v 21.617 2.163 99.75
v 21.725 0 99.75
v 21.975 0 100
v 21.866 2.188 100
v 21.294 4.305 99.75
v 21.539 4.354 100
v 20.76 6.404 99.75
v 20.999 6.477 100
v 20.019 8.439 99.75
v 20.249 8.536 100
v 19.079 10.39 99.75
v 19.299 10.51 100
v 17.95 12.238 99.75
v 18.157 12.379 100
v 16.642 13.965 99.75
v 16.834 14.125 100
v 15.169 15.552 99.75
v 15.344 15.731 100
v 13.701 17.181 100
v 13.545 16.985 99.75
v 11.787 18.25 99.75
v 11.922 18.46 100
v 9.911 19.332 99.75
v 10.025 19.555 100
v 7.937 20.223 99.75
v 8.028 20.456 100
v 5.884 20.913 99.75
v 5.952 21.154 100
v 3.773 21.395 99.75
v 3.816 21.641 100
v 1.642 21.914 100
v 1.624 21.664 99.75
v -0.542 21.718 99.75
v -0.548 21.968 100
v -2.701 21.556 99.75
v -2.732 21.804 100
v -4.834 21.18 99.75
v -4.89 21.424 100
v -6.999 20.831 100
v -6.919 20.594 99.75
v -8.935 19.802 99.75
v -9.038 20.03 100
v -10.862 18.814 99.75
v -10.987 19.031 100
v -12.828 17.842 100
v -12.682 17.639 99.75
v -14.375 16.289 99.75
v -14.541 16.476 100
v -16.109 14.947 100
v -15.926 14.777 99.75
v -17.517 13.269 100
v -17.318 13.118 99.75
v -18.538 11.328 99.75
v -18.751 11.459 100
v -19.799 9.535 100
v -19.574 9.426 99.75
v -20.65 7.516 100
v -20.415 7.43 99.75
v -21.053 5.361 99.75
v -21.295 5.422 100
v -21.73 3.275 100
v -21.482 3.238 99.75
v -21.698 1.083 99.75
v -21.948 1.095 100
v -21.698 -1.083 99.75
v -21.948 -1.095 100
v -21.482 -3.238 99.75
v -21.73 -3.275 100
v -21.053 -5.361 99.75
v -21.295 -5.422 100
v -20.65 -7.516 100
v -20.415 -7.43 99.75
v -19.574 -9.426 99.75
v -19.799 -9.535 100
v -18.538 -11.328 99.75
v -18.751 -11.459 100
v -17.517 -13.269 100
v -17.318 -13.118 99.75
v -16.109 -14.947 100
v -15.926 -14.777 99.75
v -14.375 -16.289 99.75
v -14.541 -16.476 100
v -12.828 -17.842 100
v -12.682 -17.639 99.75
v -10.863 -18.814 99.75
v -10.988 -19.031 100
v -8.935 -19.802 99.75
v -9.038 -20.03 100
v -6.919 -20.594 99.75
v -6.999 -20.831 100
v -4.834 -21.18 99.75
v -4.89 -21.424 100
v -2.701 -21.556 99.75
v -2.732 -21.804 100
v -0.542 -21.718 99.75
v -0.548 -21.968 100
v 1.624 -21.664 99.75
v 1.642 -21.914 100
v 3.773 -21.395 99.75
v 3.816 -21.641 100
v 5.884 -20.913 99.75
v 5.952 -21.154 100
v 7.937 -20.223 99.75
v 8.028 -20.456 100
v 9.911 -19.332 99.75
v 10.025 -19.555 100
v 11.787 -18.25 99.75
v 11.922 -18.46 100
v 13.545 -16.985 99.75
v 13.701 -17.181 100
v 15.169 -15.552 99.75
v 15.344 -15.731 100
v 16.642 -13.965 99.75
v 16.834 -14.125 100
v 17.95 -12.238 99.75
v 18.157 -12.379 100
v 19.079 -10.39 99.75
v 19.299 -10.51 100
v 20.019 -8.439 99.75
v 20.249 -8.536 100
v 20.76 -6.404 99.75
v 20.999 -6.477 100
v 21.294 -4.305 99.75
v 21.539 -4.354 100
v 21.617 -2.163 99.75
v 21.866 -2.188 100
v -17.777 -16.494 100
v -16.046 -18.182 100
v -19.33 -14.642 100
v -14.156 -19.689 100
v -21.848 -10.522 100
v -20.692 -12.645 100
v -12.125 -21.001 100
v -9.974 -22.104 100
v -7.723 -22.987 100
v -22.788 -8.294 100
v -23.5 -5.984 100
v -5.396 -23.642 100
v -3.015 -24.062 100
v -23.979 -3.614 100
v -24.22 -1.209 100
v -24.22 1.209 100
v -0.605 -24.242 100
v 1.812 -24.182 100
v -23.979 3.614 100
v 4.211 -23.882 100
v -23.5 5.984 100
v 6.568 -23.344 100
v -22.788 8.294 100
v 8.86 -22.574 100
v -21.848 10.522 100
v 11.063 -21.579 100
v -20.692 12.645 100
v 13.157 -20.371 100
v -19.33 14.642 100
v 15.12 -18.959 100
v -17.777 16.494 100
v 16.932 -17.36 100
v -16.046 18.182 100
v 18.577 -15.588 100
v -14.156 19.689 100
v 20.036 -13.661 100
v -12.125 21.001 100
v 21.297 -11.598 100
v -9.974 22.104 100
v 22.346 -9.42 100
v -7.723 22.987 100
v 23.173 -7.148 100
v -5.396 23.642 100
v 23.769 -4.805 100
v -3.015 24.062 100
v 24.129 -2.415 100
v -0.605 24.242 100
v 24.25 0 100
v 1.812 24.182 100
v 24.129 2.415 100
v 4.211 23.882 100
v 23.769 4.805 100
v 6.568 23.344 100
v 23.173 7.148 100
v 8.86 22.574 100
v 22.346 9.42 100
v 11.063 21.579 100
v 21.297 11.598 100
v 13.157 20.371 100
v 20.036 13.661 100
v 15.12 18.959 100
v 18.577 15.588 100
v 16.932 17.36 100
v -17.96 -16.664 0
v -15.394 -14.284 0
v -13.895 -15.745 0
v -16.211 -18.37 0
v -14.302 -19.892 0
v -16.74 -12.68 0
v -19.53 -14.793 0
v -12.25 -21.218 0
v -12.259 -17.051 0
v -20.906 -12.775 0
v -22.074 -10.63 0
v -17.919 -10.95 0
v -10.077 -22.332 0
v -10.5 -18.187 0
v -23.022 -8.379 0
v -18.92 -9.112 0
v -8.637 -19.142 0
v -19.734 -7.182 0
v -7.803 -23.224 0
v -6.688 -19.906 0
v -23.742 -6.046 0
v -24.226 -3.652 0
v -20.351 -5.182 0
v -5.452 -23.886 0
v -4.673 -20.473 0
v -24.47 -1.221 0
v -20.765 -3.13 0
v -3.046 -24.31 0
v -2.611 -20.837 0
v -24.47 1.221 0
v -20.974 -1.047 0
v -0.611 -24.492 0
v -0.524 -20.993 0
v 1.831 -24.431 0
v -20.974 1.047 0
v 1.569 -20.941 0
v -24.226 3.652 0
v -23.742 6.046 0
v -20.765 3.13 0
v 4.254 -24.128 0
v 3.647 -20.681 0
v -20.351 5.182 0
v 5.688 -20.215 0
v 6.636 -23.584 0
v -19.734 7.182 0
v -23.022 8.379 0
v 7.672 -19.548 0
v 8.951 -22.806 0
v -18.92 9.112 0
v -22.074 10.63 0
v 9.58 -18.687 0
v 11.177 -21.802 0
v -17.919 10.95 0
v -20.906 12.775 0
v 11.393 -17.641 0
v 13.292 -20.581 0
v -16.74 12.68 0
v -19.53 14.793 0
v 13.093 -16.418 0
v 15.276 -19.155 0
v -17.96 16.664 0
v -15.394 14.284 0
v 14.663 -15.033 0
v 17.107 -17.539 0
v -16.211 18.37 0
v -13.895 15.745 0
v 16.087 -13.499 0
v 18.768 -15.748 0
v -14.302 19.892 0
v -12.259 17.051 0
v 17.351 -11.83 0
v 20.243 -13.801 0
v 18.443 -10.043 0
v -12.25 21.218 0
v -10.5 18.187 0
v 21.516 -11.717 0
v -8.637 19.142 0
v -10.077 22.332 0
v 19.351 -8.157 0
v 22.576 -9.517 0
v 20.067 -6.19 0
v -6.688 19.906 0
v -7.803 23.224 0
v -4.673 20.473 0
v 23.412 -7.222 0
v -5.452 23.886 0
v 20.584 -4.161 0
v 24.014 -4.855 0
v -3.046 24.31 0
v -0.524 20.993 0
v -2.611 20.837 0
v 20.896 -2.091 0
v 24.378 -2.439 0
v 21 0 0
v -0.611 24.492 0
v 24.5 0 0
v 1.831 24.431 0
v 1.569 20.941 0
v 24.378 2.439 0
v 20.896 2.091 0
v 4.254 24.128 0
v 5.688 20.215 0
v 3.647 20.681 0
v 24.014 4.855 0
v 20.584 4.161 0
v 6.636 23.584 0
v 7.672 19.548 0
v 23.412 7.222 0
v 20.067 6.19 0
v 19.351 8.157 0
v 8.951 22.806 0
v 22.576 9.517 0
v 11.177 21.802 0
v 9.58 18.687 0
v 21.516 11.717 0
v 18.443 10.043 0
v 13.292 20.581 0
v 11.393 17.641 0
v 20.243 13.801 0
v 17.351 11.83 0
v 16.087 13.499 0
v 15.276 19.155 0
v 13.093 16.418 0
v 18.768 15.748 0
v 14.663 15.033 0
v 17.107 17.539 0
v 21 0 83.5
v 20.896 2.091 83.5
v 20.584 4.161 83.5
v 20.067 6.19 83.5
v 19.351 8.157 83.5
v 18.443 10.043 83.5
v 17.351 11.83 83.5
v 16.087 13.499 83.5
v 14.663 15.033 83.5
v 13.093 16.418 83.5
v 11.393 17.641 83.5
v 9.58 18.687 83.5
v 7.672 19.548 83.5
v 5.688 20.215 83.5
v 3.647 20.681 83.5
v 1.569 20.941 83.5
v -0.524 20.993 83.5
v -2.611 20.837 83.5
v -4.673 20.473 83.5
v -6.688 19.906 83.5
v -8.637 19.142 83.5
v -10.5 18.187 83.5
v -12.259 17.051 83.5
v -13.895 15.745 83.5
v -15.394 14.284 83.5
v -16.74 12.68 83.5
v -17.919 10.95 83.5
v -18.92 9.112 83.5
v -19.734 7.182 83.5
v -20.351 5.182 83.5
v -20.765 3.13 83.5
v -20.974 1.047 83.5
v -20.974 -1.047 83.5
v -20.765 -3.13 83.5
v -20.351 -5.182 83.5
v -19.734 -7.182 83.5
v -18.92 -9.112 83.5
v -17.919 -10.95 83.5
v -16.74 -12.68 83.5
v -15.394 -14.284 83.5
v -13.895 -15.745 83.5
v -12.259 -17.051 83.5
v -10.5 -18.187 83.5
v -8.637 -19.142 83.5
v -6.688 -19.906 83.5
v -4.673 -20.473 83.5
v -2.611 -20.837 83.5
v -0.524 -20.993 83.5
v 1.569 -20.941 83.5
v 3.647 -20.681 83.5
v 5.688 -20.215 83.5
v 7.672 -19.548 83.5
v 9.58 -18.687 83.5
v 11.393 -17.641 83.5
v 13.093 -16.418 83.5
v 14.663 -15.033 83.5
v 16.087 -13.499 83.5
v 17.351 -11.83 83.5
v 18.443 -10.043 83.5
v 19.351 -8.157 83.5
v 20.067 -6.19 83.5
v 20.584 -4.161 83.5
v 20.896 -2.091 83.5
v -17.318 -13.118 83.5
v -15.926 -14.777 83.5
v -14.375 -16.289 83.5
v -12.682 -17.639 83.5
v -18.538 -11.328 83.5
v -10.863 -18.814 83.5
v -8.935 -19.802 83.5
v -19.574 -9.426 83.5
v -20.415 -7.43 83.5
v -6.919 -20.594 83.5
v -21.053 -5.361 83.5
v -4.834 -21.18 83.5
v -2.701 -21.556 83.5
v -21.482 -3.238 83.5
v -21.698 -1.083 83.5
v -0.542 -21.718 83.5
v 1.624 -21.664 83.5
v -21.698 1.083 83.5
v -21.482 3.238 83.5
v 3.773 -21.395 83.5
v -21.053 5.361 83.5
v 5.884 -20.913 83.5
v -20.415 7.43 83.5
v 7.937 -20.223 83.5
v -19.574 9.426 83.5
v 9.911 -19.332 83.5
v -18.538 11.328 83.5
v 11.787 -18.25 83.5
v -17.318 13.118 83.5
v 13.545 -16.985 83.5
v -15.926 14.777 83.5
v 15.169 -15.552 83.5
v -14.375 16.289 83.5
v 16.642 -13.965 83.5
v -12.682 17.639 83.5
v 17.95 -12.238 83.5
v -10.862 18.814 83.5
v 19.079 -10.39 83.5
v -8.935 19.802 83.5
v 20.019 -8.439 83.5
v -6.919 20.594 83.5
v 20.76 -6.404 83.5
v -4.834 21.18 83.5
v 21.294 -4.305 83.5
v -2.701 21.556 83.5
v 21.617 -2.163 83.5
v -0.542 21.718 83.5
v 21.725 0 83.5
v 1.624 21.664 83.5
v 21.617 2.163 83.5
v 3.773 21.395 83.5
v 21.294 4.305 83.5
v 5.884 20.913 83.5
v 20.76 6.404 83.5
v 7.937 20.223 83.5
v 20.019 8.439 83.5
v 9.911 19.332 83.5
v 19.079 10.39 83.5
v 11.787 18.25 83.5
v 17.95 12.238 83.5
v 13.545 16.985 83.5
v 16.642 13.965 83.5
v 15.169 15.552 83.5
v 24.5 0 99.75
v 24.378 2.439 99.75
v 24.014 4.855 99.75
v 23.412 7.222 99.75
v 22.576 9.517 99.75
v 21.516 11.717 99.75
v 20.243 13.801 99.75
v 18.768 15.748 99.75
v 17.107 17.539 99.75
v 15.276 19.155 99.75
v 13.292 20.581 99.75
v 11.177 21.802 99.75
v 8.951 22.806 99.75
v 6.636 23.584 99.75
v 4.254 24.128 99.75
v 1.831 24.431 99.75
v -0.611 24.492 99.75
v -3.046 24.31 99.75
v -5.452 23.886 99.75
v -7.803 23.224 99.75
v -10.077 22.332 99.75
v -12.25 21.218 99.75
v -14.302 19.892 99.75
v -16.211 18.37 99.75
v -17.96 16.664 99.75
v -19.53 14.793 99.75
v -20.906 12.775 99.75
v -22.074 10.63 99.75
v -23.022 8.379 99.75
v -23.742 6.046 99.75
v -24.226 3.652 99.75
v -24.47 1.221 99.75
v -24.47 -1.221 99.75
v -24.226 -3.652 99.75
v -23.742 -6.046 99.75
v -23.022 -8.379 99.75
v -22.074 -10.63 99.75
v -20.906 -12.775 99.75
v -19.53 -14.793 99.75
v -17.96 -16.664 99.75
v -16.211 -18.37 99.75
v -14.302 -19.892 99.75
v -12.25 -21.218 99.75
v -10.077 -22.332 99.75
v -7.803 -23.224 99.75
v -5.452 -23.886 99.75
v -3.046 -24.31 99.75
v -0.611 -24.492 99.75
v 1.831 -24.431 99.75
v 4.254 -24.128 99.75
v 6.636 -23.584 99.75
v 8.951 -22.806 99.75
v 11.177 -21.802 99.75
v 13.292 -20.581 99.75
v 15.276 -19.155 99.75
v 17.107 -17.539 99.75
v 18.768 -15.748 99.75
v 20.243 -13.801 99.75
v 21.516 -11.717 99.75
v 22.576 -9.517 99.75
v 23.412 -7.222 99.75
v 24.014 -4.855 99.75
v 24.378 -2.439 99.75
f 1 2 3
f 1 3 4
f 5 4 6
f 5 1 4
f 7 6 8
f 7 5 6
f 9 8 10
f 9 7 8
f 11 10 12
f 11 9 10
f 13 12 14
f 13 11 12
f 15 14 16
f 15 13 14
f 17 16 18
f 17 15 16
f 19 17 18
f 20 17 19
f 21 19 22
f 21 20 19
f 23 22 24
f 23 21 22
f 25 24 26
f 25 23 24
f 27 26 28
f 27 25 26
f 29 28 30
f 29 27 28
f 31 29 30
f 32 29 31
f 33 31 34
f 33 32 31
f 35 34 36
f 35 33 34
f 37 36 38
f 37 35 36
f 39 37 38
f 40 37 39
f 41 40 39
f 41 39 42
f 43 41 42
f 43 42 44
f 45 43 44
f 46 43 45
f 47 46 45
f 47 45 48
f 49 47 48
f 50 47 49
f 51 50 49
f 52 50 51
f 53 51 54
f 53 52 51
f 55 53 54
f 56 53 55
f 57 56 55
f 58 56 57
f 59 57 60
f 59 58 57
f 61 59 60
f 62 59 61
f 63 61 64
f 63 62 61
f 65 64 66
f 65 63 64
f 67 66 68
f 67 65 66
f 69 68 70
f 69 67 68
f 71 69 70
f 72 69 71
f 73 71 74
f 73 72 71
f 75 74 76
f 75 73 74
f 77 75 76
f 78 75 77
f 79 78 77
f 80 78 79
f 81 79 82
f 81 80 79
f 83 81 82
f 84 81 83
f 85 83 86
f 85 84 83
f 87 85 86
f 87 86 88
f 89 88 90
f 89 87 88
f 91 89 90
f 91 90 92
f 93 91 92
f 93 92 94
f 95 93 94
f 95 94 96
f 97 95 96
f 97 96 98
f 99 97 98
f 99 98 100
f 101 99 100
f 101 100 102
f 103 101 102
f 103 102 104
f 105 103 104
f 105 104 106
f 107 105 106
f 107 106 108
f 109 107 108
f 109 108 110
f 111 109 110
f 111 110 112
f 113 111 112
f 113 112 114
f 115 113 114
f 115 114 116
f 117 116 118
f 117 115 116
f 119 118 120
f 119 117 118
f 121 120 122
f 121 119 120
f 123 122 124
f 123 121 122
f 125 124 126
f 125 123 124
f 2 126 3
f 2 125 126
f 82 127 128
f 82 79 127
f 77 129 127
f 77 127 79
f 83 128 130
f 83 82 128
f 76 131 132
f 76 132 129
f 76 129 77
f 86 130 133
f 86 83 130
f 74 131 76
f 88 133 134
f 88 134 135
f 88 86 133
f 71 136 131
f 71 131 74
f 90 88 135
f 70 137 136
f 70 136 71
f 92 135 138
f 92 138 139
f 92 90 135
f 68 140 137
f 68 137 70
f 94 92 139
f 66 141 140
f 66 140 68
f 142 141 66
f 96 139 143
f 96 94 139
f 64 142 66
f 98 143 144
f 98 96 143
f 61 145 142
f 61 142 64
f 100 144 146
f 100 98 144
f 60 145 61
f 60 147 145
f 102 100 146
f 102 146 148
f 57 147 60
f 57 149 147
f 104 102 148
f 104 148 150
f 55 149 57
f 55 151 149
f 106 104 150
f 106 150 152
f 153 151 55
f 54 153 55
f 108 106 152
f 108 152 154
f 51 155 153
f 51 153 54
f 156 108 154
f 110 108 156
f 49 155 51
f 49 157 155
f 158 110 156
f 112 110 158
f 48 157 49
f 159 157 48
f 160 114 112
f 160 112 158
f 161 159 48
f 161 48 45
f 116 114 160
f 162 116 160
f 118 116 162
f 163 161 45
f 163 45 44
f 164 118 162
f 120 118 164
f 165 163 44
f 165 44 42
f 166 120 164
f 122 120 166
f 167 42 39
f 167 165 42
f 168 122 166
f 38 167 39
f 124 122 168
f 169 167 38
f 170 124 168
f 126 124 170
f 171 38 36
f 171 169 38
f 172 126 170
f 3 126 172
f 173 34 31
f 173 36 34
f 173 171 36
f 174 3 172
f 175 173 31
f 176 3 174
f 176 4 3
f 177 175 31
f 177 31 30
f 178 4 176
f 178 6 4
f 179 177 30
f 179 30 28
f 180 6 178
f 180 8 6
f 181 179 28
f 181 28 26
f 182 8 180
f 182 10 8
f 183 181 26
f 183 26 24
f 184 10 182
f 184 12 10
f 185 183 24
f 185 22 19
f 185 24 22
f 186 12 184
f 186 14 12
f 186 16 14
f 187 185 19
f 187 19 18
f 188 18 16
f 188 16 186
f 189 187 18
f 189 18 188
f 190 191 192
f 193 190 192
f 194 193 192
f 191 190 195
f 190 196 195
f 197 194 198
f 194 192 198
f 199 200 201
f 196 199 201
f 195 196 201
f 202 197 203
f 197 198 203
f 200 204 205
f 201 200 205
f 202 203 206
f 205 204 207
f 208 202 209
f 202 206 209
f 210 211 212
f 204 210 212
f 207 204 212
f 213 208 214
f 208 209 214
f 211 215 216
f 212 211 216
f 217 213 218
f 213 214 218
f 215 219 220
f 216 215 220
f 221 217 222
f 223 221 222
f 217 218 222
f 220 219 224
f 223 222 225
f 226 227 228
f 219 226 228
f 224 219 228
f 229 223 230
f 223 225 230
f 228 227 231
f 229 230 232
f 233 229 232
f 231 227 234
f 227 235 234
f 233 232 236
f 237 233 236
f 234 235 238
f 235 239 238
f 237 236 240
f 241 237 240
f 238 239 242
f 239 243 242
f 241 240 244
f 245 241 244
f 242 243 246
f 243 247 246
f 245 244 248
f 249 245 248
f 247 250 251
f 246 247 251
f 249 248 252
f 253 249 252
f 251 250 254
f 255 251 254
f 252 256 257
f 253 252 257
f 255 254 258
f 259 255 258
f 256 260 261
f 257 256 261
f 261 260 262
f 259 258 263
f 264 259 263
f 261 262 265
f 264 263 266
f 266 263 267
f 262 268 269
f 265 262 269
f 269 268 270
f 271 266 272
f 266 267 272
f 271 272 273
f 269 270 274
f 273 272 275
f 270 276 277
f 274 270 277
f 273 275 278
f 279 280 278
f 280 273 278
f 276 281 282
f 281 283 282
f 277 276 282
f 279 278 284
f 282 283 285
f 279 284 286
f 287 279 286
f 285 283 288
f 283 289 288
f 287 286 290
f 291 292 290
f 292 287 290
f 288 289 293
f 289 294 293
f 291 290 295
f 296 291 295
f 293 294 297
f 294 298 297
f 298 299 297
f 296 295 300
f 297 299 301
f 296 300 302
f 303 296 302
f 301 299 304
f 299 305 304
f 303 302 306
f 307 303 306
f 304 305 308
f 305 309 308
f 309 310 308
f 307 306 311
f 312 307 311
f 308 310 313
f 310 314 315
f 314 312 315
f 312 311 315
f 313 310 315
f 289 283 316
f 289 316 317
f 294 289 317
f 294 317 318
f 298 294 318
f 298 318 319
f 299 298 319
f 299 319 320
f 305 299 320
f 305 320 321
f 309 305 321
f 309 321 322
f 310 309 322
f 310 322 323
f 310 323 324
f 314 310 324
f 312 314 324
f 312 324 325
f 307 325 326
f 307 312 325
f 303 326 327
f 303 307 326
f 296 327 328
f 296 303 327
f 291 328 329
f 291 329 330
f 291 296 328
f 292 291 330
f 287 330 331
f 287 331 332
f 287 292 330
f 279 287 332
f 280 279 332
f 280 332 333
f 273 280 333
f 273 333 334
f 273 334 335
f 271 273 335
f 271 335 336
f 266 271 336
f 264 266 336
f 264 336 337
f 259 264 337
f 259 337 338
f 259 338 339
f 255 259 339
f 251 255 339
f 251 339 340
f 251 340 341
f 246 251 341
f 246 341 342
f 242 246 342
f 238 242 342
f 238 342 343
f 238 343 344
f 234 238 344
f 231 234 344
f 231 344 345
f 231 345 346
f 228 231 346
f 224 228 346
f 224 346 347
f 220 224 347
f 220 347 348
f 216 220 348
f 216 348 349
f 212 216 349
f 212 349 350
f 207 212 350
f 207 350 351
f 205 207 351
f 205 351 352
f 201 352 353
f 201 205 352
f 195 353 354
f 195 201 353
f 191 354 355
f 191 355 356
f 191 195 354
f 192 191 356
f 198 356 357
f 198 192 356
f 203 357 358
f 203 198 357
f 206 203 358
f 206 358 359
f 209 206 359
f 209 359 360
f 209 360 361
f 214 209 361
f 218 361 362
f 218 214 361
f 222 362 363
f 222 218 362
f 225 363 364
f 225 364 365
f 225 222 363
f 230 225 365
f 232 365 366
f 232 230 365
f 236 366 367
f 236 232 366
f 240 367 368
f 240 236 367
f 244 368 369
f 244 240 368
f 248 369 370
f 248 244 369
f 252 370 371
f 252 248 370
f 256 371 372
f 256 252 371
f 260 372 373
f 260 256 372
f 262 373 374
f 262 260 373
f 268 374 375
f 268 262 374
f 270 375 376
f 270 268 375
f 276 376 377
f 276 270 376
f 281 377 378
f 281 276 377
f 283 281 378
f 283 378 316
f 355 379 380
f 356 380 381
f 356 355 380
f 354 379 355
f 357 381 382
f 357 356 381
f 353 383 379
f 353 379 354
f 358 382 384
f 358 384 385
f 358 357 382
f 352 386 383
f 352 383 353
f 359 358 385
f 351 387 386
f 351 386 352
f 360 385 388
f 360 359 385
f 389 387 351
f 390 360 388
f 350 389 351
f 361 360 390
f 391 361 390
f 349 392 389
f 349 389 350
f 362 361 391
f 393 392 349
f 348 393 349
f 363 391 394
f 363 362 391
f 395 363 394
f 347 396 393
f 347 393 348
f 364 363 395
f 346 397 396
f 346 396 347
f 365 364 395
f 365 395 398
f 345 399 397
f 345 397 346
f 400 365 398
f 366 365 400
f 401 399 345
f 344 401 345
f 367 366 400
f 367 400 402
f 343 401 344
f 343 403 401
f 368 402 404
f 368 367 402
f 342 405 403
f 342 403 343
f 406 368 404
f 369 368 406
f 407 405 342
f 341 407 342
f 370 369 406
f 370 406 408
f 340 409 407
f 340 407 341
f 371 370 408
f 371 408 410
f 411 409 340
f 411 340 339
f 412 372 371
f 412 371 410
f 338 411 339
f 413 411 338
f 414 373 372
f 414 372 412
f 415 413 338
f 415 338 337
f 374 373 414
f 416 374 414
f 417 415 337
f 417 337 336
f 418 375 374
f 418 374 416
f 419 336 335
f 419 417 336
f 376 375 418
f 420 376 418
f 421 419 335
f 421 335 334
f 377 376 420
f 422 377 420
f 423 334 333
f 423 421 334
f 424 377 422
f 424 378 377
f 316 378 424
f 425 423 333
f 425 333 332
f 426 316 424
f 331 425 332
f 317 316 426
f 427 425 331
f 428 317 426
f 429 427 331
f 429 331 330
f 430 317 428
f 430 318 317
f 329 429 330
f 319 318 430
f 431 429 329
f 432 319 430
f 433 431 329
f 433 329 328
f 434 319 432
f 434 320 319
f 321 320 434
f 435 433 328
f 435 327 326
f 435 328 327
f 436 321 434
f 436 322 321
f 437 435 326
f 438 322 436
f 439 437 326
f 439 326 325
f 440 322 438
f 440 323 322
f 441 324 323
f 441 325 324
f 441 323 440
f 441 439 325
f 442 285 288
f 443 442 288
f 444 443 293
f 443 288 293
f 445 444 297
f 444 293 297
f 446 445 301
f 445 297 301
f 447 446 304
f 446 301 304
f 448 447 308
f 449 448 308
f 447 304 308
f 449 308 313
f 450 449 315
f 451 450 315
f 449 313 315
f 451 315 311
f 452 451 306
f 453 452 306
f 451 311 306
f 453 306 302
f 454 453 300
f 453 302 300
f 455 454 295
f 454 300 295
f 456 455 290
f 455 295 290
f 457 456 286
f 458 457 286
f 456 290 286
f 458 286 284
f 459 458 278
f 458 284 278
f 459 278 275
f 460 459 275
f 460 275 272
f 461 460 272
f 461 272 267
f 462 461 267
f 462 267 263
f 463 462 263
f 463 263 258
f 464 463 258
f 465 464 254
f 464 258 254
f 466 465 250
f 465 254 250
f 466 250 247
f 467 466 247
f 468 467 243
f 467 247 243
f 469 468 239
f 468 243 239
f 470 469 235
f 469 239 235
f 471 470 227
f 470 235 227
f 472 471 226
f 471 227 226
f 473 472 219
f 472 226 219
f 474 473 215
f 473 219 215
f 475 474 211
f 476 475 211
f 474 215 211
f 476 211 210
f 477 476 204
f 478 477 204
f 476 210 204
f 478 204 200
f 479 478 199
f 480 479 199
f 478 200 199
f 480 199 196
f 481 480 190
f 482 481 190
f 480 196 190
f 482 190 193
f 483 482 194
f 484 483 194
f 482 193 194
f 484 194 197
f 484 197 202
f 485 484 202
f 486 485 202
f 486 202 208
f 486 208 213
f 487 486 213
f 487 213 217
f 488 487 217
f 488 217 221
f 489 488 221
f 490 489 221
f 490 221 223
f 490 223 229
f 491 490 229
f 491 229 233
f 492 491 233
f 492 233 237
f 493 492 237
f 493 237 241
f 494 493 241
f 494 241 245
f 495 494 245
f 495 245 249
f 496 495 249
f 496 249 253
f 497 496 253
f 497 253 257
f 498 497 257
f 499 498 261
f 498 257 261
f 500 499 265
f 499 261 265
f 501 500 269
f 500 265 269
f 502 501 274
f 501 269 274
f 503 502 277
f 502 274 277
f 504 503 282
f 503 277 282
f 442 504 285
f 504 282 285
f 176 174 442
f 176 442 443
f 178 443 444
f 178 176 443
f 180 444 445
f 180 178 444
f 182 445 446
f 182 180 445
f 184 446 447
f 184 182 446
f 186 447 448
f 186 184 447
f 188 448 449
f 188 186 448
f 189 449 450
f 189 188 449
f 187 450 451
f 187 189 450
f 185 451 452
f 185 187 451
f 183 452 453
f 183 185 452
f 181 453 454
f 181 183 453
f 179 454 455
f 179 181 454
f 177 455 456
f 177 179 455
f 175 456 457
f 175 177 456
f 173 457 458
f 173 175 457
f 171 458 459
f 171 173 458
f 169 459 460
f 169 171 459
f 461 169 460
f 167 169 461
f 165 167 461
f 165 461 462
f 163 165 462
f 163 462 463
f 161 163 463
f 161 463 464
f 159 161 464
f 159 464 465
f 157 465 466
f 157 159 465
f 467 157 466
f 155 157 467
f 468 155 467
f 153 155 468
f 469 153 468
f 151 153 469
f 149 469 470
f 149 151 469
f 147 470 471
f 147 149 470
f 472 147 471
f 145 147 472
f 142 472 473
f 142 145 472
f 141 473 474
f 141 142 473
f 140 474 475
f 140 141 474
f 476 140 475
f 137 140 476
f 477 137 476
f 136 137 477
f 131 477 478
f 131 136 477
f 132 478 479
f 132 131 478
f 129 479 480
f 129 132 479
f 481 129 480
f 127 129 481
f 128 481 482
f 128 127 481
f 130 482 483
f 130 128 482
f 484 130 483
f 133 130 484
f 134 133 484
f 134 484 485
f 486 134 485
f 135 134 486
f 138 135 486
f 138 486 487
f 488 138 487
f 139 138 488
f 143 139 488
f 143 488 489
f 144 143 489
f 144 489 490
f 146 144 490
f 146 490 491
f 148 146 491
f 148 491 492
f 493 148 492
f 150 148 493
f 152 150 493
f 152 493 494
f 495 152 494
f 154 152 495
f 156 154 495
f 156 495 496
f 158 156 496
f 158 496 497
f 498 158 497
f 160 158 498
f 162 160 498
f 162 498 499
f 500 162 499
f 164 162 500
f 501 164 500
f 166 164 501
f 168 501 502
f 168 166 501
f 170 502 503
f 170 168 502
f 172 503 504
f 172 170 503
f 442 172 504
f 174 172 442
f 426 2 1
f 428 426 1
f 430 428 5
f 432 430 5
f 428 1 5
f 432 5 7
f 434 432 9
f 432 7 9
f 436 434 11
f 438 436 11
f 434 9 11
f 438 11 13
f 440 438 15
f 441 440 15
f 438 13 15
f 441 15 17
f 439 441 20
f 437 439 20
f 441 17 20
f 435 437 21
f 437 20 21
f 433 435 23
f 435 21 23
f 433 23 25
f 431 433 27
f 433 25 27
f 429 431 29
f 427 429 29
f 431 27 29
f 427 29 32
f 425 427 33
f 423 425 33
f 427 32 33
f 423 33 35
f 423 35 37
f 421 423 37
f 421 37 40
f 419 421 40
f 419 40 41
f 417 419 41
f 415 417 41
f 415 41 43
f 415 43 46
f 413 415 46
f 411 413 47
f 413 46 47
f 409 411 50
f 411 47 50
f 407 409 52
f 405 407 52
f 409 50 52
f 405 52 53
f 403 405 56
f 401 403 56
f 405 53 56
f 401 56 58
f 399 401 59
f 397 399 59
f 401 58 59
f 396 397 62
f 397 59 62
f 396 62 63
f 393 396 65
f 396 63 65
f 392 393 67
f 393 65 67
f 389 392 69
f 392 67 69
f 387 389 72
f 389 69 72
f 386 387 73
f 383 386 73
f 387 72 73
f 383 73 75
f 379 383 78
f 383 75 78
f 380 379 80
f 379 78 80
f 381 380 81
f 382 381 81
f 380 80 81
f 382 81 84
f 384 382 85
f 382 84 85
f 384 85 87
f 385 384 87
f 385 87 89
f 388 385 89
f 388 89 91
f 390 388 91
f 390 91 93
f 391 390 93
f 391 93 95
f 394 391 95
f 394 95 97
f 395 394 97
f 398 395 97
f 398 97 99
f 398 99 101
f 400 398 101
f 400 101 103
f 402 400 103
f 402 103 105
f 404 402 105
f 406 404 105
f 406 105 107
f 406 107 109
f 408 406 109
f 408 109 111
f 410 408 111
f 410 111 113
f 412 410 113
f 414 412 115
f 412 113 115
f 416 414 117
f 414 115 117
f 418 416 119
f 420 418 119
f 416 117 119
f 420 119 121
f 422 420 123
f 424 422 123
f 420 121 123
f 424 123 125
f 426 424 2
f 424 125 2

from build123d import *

# Parameters (mm, degrees)
F0_R     = 24.5
F0_R_2   = 21
F1_DEPTH = 100
F2_R     = 21.725
F2_R_2   = 21
F3_DEPTH = 16.5
F4_SIZE  = 0.25


with BuildPart() as f1:
    # F0 (on Top) → F1 (new body)
    with BuildSketch(Plane.XY):
        Circle(F0_R)
        Circle(F0_R_2, mode=Mode.SUBTRACT)
    extrude(amount=F1_DEPTH)

    # F2 (on face) → F3 (cut)
    with BuildSketch(Plane.XY.offset(100)):
        Circle(F2_R)
        Circle(F2_R_2, mode=Mode.SUBTRACT)
    extrude(amount=-F3_DEPTH, mode=Mode.SUBTRACT)

    # F4
    f4_edges = [f1.edges().sort_by_distance(p)[0] for p in [
        (-24.5, 0, 100),
        (-21.725, 0, 100),
    ]]
    chamfer(f4_edges, length=F4_SIZE)


solid = f1.part
